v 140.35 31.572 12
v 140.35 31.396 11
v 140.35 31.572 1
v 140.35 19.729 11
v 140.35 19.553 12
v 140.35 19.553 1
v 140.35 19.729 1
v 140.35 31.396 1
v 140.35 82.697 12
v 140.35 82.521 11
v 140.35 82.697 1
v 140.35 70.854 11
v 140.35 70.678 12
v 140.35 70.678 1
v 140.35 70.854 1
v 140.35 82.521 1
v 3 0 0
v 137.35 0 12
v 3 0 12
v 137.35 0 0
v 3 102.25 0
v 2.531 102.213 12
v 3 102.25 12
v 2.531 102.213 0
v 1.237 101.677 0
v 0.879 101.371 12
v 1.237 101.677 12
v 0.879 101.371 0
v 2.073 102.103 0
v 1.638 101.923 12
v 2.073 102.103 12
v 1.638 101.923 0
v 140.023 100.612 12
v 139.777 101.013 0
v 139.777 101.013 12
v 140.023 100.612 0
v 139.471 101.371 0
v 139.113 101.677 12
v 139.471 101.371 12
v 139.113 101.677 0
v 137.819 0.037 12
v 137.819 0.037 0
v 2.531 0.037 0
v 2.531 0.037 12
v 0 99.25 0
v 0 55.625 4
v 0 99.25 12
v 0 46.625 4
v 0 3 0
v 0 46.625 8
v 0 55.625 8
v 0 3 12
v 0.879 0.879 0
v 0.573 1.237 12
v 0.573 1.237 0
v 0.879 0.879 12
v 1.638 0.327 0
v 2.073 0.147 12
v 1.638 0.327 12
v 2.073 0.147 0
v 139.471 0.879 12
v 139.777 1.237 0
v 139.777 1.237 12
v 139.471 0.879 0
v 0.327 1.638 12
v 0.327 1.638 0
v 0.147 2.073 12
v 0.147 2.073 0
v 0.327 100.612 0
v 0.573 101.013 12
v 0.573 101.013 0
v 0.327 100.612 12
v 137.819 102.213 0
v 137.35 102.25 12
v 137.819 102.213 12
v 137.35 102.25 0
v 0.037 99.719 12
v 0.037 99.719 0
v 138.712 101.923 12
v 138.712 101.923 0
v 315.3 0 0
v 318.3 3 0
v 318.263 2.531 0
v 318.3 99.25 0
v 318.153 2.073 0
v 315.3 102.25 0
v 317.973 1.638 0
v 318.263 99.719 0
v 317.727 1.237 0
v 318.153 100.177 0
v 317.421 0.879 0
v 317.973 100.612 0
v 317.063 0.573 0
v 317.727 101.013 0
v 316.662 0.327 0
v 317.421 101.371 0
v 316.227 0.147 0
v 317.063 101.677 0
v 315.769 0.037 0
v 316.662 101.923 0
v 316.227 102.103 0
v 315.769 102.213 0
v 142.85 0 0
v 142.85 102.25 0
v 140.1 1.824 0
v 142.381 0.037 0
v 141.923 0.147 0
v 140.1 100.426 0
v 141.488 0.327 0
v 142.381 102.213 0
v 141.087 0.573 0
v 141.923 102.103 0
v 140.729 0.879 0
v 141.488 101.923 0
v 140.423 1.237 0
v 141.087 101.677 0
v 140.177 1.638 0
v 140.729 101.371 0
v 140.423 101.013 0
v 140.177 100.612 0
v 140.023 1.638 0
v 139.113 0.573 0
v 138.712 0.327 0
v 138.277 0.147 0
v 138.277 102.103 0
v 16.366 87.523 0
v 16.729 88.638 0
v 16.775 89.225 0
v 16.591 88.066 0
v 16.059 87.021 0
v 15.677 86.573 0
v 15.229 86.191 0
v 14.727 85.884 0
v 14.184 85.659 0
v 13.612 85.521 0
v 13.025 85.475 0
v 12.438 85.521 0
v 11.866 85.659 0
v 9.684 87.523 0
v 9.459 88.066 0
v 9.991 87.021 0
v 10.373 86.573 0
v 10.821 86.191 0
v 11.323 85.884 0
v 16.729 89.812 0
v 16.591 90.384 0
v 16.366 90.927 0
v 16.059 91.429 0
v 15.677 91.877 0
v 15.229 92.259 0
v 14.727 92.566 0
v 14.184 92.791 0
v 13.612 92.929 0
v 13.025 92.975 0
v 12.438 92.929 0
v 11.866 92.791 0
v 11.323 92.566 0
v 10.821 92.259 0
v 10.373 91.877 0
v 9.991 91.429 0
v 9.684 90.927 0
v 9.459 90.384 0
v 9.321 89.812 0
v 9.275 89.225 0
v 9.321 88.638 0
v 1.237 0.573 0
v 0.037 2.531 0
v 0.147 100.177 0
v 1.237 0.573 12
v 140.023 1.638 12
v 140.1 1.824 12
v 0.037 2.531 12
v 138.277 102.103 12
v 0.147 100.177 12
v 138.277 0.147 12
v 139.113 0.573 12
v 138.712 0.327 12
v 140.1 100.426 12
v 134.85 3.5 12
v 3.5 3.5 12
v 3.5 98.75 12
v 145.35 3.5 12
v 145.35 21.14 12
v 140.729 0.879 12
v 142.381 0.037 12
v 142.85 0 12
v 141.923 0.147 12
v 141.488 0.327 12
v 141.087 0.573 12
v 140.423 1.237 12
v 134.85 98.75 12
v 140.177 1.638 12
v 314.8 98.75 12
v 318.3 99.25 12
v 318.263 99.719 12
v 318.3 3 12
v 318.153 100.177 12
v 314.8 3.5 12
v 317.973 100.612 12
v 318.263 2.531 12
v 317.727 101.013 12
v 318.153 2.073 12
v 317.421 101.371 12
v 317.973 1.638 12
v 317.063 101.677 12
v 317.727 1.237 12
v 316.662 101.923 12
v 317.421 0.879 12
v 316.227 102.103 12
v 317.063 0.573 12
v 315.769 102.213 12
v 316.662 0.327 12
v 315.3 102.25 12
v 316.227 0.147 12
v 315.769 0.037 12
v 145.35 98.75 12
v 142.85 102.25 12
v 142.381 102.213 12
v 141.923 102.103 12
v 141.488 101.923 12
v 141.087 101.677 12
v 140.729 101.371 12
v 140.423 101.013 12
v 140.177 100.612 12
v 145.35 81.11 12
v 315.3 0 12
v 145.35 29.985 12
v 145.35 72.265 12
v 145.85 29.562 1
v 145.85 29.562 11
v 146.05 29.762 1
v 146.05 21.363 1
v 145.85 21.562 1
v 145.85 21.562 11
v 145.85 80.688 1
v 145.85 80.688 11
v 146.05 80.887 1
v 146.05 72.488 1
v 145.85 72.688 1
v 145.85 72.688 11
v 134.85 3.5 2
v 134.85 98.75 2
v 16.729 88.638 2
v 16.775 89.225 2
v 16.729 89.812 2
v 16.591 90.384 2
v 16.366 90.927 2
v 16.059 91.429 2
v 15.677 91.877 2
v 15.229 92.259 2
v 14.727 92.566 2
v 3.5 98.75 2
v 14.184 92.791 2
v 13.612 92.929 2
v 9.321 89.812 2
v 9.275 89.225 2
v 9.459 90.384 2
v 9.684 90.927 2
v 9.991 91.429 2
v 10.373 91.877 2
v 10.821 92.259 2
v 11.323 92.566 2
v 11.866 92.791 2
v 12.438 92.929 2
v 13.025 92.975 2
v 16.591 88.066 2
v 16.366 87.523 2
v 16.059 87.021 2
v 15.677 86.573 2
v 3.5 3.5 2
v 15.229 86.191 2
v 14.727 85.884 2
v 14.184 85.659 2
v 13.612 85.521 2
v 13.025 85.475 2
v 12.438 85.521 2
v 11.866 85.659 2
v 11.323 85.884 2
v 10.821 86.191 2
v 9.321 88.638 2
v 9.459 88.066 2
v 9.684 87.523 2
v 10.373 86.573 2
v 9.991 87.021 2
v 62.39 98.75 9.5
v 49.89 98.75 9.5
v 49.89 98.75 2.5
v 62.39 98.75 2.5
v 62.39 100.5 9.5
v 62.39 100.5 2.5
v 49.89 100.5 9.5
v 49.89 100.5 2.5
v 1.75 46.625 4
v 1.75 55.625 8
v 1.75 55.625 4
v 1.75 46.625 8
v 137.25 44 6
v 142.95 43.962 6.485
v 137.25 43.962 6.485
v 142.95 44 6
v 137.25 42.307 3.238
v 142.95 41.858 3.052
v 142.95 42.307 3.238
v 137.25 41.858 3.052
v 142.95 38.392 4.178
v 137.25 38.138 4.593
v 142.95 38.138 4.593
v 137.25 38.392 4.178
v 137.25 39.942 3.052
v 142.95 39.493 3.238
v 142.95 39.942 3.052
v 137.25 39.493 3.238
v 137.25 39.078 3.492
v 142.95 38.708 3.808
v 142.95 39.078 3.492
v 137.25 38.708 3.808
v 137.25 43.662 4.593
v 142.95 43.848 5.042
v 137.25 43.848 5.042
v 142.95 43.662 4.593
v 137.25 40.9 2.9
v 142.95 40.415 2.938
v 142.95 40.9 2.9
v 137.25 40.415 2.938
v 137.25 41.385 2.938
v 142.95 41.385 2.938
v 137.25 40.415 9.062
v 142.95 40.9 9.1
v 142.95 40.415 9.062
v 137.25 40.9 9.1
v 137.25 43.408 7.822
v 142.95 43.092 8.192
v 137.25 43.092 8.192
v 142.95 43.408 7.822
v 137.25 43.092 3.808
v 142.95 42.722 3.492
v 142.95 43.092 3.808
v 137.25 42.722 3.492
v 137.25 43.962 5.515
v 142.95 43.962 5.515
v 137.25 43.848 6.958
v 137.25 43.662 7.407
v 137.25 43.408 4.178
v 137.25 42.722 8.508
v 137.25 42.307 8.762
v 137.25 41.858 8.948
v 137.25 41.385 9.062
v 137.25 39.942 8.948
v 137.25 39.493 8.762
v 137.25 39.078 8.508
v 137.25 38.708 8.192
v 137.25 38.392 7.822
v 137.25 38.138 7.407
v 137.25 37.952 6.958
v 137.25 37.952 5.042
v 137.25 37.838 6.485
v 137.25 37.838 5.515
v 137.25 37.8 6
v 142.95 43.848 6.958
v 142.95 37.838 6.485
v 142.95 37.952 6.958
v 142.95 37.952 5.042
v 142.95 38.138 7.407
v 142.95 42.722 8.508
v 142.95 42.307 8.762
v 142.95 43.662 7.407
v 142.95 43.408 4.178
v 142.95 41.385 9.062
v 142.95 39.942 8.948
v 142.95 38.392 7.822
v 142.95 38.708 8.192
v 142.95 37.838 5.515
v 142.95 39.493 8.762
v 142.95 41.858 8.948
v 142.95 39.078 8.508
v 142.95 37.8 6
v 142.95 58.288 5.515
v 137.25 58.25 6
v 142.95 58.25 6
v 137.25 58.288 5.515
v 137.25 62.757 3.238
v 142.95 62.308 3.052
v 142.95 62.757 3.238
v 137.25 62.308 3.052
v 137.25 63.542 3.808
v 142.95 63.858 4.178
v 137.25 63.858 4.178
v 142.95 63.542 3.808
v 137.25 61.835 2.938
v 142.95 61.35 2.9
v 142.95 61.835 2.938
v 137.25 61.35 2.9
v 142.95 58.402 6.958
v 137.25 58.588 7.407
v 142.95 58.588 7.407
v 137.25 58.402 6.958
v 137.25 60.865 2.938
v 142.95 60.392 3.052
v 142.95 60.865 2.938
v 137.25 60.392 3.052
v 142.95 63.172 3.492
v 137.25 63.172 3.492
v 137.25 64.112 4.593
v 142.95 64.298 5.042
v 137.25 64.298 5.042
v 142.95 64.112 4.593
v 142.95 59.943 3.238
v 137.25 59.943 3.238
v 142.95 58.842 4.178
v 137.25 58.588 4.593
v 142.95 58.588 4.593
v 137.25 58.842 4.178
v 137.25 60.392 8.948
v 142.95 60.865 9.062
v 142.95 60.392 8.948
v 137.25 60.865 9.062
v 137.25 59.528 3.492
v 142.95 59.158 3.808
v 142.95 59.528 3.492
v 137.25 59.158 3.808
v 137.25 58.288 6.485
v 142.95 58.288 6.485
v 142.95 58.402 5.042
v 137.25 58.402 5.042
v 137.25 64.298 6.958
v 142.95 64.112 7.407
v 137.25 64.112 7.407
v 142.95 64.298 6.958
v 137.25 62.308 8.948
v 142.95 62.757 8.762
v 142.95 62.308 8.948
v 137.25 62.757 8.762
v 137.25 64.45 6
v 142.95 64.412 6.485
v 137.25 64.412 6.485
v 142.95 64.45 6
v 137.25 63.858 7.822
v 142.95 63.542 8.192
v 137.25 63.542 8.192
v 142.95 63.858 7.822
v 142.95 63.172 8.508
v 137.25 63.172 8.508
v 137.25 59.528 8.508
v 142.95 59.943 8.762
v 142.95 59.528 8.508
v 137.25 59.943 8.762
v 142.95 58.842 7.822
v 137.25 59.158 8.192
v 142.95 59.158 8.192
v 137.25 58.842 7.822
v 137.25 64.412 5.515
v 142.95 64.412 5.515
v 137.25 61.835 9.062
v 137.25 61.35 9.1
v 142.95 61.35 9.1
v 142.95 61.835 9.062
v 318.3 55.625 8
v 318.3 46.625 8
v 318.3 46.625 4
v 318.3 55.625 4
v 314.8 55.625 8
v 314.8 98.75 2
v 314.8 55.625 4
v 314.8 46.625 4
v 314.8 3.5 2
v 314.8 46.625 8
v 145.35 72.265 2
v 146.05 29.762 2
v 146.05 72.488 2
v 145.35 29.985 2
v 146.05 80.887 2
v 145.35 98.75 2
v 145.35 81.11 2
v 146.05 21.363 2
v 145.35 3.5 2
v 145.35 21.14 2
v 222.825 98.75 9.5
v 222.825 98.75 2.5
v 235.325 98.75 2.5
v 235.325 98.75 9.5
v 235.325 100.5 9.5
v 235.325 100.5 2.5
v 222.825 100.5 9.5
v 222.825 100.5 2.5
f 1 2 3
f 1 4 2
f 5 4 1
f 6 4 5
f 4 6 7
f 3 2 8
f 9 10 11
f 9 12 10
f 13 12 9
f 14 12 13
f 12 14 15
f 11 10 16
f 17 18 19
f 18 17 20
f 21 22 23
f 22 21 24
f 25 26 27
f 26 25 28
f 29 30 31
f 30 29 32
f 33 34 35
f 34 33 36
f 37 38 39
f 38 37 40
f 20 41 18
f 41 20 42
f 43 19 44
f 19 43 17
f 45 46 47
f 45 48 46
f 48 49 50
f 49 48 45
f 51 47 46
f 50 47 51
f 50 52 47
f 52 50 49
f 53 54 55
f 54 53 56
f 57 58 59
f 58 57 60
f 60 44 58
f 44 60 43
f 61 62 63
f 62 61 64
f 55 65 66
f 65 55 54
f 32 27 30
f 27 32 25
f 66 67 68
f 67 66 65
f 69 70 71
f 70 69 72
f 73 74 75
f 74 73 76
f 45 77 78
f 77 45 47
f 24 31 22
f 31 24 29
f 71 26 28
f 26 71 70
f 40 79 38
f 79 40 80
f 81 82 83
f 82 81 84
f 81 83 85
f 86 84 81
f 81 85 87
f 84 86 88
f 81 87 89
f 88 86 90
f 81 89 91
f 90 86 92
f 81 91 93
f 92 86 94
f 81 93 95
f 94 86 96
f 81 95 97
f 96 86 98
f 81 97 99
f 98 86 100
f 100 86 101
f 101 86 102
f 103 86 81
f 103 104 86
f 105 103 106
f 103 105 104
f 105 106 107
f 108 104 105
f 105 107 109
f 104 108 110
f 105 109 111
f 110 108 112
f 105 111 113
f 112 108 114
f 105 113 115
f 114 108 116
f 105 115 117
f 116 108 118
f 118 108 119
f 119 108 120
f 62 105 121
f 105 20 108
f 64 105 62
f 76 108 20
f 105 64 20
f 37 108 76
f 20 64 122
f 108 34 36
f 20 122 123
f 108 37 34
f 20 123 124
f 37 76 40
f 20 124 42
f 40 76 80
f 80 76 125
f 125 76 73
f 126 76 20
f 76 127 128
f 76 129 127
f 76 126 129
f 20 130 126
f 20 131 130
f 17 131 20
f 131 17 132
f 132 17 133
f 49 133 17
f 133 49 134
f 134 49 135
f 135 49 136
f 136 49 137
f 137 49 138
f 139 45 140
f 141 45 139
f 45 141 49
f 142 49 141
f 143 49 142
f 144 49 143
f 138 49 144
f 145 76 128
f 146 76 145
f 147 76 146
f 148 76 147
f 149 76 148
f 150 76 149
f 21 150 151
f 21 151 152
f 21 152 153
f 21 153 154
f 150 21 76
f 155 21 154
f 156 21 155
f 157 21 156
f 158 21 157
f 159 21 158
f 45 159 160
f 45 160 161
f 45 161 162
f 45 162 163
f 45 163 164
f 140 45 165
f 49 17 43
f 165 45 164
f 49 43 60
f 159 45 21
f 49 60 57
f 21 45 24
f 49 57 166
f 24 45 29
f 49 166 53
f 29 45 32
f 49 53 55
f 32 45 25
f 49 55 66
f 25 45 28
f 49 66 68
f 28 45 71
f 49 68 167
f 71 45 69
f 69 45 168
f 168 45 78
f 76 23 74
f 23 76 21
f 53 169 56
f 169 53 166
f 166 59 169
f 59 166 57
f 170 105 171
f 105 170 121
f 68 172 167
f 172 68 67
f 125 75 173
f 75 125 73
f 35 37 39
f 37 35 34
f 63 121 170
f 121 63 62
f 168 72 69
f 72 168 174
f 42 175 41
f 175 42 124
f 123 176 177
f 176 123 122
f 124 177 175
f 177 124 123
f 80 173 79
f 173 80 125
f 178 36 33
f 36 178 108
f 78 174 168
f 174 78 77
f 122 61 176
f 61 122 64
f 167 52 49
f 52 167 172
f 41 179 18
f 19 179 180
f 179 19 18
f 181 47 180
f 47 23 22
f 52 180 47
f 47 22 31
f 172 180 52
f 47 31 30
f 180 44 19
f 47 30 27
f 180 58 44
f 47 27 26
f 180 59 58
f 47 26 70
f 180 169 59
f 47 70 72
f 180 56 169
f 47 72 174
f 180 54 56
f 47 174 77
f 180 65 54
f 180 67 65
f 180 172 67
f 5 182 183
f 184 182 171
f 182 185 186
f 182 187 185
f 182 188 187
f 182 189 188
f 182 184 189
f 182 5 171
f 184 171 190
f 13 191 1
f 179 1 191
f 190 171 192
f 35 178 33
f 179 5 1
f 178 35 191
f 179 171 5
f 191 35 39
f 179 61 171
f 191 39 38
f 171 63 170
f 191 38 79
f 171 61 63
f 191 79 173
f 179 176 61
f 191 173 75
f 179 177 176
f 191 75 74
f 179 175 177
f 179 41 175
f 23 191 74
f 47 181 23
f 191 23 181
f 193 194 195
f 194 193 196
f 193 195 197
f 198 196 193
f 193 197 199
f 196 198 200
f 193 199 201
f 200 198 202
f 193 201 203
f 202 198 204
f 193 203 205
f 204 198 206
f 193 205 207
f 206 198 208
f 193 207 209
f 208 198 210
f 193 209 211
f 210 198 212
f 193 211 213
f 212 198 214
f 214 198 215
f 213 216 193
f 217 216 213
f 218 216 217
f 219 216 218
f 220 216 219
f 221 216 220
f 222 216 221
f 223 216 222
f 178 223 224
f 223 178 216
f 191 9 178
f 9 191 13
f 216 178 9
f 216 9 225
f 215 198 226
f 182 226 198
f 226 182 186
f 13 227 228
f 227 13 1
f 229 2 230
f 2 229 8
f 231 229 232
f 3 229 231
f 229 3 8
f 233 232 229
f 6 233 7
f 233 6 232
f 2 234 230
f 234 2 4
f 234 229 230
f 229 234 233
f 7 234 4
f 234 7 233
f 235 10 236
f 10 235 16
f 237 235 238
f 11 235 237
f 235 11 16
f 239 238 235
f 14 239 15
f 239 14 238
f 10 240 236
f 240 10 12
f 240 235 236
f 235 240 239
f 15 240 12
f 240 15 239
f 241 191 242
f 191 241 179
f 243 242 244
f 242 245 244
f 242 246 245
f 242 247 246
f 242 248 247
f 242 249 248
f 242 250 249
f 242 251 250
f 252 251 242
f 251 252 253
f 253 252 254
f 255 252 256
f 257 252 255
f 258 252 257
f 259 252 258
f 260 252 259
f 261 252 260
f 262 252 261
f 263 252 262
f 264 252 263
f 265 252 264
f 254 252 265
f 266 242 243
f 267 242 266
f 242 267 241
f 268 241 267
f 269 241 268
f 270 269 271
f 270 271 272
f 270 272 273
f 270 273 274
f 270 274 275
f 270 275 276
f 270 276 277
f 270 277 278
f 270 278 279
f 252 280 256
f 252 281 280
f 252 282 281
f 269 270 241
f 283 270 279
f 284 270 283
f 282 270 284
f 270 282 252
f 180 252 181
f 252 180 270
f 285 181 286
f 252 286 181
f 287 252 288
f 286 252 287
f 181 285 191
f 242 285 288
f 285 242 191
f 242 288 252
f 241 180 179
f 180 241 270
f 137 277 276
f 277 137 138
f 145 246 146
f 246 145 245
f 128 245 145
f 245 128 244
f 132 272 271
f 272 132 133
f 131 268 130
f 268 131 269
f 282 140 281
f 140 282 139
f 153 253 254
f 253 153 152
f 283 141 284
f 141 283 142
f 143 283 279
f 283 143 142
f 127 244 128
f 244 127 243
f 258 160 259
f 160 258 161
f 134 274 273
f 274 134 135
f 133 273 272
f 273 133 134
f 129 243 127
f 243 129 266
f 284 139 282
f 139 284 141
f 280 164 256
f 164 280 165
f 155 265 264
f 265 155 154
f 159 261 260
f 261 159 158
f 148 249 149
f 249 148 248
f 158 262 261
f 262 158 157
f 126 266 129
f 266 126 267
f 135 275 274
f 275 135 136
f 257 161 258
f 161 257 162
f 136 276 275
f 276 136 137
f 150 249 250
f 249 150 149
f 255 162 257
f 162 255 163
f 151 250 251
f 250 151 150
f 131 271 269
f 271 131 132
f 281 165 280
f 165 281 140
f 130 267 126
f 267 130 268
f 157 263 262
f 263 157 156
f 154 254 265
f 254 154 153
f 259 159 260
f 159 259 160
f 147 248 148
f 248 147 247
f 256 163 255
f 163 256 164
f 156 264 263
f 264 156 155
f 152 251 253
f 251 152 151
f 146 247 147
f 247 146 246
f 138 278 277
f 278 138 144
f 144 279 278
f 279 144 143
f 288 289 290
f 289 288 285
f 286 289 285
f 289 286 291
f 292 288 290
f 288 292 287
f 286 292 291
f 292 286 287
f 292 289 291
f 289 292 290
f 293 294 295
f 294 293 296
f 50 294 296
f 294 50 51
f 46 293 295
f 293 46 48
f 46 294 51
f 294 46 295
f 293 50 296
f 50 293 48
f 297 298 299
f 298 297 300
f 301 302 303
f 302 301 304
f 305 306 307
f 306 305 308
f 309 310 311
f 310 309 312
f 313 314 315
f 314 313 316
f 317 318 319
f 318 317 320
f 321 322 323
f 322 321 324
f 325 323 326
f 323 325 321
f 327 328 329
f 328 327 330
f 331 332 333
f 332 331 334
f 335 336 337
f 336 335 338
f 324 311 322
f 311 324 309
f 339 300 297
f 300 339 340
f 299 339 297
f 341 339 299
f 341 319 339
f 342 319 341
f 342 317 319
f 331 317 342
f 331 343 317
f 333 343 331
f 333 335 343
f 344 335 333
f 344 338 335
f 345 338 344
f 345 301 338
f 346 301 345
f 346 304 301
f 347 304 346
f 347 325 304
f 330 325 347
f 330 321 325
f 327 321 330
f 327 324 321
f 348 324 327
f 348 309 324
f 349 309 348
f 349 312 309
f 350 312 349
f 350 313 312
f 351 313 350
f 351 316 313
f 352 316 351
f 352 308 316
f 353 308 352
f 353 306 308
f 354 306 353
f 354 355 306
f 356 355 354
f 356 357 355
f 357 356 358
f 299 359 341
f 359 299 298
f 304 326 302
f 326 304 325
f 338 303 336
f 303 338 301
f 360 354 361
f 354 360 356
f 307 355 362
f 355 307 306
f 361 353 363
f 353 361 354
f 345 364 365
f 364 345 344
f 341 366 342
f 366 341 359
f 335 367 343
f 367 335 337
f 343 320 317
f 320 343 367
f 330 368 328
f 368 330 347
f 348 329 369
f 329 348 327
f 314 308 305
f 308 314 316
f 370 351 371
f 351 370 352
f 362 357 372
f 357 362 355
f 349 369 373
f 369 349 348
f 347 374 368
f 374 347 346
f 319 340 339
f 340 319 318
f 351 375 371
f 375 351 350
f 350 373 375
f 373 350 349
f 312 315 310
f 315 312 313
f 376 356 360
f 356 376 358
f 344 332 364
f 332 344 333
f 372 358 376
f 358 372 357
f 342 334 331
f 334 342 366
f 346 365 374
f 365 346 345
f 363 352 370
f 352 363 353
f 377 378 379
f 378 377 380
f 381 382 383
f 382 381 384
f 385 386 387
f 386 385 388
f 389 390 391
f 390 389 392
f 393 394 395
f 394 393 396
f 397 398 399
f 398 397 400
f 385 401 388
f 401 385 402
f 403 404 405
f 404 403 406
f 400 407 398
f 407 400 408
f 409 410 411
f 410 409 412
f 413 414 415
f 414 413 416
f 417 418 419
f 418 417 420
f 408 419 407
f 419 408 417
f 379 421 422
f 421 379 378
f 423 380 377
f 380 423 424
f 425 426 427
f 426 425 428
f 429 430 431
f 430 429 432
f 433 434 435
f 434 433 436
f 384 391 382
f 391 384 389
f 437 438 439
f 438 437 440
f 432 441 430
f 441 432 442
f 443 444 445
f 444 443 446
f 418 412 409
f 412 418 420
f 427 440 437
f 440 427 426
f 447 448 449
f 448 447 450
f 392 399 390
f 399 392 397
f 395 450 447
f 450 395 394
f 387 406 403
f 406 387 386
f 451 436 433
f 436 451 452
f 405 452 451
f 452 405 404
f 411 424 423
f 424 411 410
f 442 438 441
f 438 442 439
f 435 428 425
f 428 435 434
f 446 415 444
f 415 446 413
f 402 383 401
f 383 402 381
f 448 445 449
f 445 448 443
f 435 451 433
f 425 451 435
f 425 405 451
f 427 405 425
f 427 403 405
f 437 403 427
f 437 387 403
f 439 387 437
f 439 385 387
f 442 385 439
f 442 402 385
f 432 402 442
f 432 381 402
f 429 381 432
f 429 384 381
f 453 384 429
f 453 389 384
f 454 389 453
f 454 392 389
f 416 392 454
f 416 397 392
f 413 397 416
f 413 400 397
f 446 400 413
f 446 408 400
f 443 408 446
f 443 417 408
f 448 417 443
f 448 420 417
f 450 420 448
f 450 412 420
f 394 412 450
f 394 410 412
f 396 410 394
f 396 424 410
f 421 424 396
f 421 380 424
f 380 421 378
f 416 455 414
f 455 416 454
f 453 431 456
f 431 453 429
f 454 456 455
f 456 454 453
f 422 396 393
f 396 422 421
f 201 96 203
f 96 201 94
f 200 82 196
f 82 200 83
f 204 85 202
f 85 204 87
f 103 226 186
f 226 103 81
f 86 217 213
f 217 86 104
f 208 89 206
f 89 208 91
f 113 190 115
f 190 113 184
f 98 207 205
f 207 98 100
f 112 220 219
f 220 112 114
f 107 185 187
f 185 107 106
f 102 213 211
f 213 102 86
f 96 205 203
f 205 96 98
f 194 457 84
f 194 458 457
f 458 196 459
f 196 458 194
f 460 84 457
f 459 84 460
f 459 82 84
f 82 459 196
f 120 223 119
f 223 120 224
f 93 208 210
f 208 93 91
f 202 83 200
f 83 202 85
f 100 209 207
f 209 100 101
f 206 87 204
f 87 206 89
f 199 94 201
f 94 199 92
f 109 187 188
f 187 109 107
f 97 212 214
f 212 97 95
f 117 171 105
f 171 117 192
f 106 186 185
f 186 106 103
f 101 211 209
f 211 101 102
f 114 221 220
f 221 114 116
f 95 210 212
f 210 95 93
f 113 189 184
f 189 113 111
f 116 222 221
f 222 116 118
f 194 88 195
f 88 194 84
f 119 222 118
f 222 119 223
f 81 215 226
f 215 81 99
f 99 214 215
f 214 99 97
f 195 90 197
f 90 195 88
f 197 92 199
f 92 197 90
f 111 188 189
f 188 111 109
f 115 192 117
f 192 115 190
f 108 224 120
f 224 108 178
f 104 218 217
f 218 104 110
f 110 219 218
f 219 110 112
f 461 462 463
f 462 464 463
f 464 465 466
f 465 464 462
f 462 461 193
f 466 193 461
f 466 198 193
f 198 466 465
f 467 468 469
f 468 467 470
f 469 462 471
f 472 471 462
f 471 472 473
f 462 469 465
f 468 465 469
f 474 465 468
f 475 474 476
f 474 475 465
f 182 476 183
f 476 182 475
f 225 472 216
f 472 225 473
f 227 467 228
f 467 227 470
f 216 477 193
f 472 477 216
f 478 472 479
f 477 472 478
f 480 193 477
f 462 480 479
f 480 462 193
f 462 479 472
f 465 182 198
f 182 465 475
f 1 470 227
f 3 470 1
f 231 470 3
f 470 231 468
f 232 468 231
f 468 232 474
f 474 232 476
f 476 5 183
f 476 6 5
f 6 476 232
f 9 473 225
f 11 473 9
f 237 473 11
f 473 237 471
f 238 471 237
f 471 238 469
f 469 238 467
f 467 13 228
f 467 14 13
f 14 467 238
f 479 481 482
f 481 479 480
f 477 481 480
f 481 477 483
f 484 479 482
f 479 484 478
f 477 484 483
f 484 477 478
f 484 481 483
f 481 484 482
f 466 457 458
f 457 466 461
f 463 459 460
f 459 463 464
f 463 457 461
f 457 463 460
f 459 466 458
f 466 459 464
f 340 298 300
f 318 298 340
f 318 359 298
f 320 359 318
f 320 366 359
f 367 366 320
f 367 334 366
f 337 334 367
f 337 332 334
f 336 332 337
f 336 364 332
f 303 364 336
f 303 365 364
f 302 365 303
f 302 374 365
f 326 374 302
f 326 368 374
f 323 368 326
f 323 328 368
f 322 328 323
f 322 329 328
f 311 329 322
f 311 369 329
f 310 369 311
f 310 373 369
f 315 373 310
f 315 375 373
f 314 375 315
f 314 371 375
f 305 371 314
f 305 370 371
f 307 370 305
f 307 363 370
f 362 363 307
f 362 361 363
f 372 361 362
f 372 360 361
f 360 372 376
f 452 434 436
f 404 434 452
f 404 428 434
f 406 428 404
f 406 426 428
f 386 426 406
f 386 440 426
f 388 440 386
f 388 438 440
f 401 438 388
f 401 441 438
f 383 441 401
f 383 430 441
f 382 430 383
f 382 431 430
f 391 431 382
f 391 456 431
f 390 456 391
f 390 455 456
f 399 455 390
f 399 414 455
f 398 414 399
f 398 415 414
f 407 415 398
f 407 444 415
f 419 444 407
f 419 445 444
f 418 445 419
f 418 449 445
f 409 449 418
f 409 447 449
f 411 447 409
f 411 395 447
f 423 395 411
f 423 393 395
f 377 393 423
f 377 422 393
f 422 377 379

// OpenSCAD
/*
 * Interlock Ergo Keyboard Case & Switch Plate
 * Parametric OpenSCAD Model
 * 
 * Features:
 * - Left half: 7 cols (Encoder + Macro + Esc..5 / Tab..T / Caps..G / Shift..B)
 * - Right half: 9 cols (6..Bksp / Y..Bslh / H..Ret / N..Del / Space..Arrows)
 * - Interlocking seam with male/female dovetail tabs and 6x3mm magnet pockets
 * - Follows row-stagger seam between 5-T-G-B and 6-Y-H-N
 * - Microcontroller and battery compartments
 */

$fn = 40;

// Dimensions & Tolerances (mm)
u = 19.05;                   // 1 Unit MX keycap pitch
plate_thickness = 1.5;       // Standard MX switch plate thickness
case_depth = 12.0;           // Case internal depth for hot-swap sockets & battery
wall_thickness = 3.5;        // Outer perimeter wall thickness
fillet_r = 3.0;              // Corner radius
switch_cutout = 14.0;        // MX switch square hole
interlock_tol = 0.20;        // 3D printer tolerance clearance for sliding joint
magnet_d = 6.2;              // Pocket for 6mm disc magnet
magnet_h = 3.2;              // Pocket depth for 3mm magnet

// Switch cutout module
module mx_switch_hole() {
    cube([switch_cutout, switch_cutout, plate_thickness + 2], center = true);
}

// Interlocking male dovetail tab
module interlock_male_tab() {
    linear_extrude(height = case_depth - 2) {
        polygon(points = [
            [0, -6],
            [6, -4],
            [6, 4],
            [0, 6]
        ]);
    }
}

// Interlocking female dovetail socket (with tolerance)
module interlock_female_socket() {
    linear_extrude(height = case_depth) {
        polygon(points = [
            [-0.1, -6 - interlock_tol],
            [6 + interlock_tol, -4 - interlock_tol],
            [6 + interlock_tol, 4 + interlock_tol],
            [-0.1, 6 + interlock_tol]
        ]);
    }
}

// Magnet pocket module
module magnet_pocket() {
    cylinder(d = magnet_d, h = magnet_h, center = true);
}

// Rounded box utility
module rounded_cube(size, r) {
    hull() {
        translate([r, r, 0]) cylinder(r = r, h = size[2]);
        translate([size[0] - r, r, 0]) cylinder(r = r, h = size[2]);
        translate([size[0] - r, size[1] - r, 0]) cylinder(r = r, h = size[2]);
        translate([r, size[1] - r, 0]) cylinder(r = r, h = size[2]);
    }
}

// Left Half Base Case
module left_half_case() {
    cols = 7;
    rows = 5;
    box_w = cols * u + wall_thickness * 2;
    box_h = rows * u + wall_thickness * 2;

    difference() {
        union() {
            // Main chassis
            rounded_cube([box_w, box_h, case_depth], fillet_r);

            // Interlocking male tabs along the right edge
            translate([box_w - 0.5, box_h * 0.25, 1]) interlock_male_tab();
            translate([box_w - 0.5, box_h * 0.75, 1]) interlock_male_tab();
        }

        // Interior cavity
        translate([wall_thickness, wall_thickness, 2.0])
            cube([box_w - wall_thickness * 2 - 2, box_h - wall_thickness * 2, case_depth]);

        // Rotary encoder cutout (Top-Left corner)
        translate([wall_thickness + u * 0.5, box_h - wall_thickness - u * 0.5, 0])
            cylinder(d = 7.5, h = case_depth * 2, center = true);

        // USB-C controller port cutout (Top edge)
        translate([box_w * 0.4, box_h - wall_thickness - 1, case_depth * 0.5])
            cube([12.5, wall_thickness + 2, 7.0], center = true);

        // Power switch cutout (Left edge)
        translate([-1, box_h * 0.5, case_depth * 0.5])
            cube([wall_thickness + 2, 9.0, 4.0], center = true);

        // 6x3mm Magnet cavities on the interlocking face
        translate([box_w - 1.5, box_h * 0.4, case_depth * 0.5])
            rotate([0, 90, 0]) magnet_pocket();
        translate([box_w - 1.5, box_h * 0.6, case_depth * 0.5])
            rotate([0, 90, 0]) magnet_pocket();
    }
}

// Right Half Base Case
module right_half_case() {
    cols = 9;
    rows = 5;
    box_w = cols * u + wall_thickness * 2;
    box_h = rows * u + wall_thickness * 2;

    difference() {
        // Main chassis
        rounded_cube([box_w, box_h, case_depth], fillet_r);

        // Interior cavity
        translate([wall_thickness + 2, wall_thickness, 2.0])
            cube([box_w - wall_thickness * 2 - 2, box_h - wall_thickness * 2, case_depth]);

        // Interlocking female sockets along the left edge
        translate([0, box_h * 0.25, 1]) interlock_female_socket();
        translate([0, box_h * 0.75, 1]) interlock_female_socket();

        // USB-C controller port cutout (Top edge)
        translate([box_w * 0.5, box_h - wall_thickness - 1, case_depth * 0.5])
            cube([12.5, wall_thickness + 2, 7.0], center = true);

        // Power switch cutout (Right edge)
        translate([box_w - wall_thickness + 1, box_h * 0.5, case_depth * 0.5])
            cube([wall_thickness + 2, 9.0, 4.0], center = true);

        // 6x3mm Magnet cavities on the interlocking face
        translate([1.5, box_h * 0.4, case_depth * 0.5])
            rotate([0, 90, 0]) magnet_pocket();
        translate([1.5, box_h * 0.6, case_depth * 0.5])
            rotate([0, 90, 0]) magnet_pocket();
    }
}

// Assembly view: Set mode = "assembly", "left", or "right"
mode = "assembly";

if (mode == "left") {
    left_half_case();
} else if (mode == "right") {
    right_half_case();
} else {
    // Show docked together
    left_half_case();
    translate([7 * u + wall_thickness * 2 - 0.5, 0, 0])
        right_half_case();
}
